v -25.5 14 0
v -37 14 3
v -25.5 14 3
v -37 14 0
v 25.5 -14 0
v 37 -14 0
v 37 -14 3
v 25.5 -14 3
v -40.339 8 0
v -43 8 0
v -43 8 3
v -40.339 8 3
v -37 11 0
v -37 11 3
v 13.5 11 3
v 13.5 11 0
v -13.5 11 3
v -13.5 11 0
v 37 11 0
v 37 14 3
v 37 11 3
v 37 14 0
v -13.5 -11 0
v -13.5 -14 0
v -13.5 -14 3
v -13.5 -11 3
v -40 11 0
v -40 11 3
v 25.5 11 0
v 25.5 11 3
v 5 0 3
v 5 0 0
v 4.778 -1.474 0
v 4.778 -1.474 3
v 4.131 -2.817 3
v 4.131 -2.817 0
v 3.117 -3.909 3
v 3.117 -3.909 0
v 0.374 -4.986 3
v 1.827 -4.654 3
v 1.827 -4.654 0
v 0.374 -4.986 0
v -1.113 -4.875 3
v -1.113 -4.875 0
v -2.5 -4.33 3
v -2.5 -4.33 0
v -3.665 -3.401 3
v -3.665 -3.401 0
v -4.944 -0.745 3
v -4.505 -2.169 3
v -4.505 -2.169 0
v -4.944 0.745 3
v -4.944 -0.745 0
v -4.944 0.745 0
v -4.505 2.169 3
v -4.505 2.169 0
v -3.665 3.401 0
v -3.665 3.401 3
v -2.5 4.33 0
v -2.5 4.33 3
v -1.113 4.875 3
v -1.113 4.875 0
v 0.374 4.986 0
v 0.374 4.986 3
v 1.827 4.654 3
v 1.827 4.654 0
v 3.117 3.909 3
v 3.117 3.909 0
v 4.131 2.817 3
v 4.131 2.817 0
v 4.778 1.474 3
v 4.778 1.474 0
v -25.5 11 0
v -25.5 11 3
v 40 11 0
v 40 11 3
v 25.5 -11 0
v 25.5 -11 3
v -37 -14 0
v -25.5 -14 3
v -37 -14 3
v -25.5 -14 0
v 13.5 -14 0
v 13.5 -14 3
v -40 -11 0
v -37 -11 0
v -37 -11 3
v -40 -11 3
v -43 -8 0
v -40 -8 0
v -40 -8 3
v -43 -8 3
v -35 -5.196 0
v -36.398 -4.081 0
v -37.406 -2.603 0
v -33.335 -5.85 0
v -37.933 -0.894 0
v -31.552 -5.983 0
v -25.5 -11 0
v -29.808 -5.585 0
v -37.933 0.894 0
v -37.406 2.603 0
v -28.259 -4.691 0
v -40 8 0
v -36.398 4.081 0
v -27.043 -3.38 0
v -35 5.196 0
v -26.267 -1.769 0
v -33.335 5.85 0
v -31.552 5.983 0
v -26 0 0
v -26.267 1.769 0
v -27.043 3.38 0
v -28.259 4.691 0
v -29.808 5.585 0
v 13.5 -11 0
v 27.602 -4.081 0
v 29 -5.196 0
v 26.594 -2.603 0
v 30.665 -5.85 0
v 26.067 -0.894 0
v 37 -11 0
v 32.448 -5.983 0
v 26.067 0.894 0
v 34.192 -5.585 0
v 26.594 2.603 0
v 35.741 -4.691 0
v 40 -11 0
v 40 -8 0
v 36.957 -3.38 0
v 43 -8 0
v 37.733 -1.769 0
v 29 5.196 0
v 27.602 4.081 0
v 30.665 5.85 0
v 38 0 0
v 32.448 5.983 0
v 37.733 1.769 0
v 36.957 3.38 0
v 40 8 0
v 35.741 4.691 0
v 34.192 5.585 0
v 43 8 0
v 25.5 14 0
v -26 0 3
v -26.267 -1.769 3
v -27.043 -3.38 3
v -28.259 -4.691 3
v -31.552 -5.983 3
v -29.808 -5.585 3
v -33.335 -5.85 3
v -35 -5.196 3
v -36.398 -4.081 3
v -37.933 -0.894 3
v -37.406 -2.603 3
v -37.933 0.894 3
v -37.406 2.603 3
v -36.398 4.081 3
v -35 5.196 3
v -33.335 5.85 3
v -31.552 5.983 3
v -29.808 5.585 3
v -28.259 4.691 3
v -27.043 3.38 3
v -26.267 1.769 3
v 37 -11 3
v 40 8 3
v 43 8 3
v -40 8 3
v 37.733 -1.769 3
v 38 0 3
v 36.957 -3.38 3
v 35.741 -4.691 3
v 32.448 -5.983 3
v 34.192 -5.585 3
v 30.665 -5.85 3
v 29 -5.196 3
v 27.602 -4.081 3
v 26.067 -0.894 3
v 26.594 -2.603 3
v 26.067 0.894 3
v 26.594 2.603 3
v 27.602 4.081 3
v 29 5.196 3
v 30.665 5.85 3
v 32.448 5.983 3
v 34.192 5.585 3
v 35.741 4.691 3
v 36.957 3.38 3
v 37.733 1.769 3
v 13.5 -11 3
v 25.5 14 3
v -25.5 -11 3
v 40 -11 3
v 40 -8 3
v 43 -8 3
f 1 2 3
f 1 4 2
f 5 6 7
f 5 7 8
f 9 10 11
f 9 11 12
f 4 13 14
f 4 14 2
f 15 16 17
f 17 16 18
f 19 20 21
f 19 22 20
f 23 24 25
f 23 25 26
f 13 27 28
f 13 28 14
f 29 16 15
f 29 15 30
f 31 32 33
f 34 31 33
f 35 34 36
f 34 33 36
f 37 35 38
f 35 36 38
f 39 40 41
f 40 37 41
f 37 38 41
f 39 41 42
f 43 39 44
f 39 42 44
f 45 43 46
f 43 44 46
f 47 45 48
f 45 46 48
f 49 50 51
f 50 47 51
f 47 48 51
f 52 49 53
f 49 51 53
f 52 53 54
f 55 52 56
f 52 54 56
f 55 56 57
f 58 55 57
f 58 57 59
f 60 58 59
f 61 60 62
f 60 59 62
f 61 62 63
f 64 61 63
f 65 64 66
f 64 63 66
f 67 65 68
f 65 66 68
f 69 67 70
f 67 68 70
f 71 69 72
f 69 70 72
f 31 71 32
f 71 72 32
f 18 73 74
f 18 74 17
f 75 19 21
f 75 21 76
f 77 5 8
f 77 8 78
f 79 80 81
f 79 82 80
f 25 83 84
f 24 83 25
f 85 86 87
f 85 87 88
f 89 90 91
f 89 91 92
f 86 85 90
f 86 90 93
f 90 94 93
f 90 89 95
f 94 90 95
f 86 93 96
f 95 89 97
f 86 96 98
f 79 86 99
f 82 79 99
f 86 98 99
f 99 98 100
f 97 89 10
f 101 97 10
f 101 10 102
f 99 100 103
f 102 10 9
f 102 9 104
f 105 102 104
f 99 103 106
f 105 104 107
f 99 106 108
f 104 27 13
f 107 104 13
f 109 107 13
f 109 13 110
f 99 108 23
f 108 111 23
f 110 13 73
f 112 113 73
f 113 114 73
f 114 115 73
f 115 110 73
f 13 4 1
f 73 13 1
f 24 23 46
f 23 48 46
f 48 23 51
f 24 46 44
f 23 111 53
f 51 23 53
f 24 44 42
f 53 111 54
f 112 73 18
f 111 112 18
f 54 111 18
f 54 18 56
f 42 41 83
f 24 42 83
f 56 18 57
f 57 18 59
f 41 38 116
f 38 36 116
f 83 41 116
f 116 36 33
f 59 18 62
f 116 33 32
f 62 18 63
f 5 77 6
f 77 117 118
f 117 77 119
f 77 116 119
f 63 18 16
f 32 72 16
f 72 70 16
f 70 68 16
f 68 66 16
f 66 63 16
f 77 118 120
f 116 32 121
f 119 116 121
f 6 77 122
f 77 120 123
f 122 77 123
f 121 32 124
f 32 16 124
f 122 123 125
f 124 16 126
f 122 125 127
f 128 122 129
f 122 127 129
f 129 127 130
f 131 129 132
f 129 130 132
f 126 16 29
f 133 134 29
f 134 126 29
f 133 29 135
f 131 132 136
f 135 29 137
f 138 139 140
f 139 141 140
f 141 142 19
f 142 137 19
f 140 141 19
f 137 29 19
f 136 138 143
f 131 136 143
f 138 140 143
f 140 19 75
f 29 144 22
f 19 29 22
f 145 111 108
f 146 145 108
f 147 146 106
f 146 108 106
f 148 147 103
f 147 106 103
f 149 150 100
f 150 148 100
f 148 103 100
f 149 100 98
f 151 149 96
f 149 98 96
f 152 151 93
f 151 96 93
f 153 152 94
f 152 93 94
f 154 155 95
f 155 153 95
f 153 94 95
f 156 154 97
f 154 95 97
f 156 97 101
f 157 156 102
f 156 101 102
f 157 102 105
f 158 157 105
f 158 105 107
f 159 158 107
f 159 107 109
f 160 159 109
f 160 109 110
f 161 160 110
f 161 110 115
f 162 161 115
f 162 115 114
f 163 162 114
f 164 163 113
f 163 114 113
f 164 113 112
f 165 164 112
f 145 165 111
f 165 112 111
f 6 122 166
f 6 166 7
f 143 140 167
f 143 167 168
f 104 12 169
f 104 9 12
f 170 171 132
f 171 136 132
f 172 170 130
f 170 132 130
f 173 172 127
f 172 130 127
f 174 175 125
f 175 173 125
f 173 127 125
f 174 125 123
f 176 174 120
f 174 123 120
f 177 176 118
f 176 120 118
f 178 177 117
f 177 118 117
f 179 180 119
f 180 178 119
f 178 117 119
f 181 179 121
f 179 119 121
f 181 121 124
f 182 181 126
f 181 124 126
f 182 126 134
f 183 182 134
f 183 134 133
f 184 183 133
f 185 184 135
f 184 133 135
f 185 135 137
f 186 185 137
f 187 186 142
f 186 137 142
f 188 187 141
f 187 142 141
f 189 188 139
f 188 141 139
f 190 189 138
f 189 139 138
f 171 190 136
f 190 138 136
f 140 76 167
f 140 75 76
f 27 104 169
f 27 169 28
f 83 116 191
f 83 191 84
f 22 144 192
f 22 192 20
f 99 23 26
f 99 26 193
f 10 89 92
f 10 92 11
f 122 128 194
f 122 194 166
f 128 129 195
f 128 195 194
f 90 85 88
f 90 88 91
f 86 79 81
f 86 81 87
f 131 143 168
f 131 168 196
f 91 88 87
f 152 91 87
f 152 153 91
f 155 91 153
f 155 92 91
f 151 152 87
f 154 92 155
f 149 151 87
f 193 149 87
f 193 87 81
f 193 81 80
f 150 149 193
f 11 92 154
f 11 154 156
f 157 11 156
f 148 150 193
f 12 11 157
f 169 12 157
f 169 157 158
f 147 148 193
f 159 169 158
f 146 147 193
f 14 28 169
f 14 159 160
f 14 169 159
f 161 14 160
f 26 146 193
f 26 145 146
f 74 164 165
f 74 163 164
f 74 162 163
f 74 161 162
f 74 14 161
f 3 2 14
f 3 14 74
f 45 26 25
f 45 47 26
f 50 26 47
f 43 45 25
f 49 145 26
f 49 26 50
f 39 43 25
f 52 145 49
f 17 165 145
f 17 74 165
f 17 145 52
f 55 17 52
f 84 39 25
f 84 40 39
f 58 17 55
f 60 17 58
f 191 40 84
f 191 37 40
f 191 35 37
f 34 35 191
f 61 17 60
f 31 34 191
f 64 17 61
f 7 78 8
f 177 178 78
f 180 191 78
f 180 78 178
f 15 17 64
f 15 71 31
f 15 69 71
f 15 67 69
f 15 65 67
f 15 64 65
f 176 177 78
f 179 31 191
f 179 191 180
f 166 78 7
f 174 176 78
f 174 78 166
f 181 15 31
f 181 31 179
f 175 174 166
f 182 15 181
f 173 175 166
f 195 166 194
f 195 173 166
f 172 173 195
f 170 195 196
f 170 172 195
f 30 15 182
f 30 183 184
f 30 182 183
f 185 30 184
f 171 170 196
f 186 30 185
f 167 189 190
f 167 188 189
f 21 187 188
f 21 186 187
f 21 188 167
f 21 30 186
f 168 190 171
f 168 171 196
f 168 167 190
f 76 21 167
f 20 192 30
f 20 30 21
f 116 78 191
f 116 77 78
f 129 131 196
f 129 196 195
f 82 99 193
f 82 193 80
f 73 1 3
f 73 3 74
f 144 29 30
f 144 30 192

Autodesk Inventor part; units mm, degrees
ref_plane "YZ Plane" through (0, 0, 0) normal (1, 0, 0) x (0, 1, 0)
ref_plane "XZ Plane" through (0, 0, 0) normal (0, 1, 0) x (-1, 0, 0)
ref_plane "XY Plane" through (0, 0, 0) normal (0, 0, 1) x (1, 0, 0)
sketch "Sketch2" plane through (0, 0, 0) normal (0, 0, 1) x (1, 0, 0)
  circle A0 centre (-32, 0) radius 7.5 construction
  circle A1 centre (32, 0) radius 7.5 construction
  circle A2 centre (0, 0) radius 5 projected
  line L0 (-13.5, 14) -> (13.5, 14) projected
  line L1 (13.5, 14) -> (13.5, 11) projected
  line L2 (13.5, 11) -> (25.5, 11) projected
  line L3 (25.5, 11) -> (25.5, 14) projected
  line L4 (25.5, 14) -> (37, 14) projected
  line L5 (37, 14) -> (37, 11) projected
  line L6 (37, 11) -> (40, 11) projected
  line L7 (40, 11) -> (40, 8) projected
  line L8 (40, 8) -> (43, 8) projected
  line L9 (43, 8) -> (43, -8) projected
  line L10 (43, -8) -> (40, -8) projected
  line L11 (40, -8) -> (40, -11) projected
  line L12 (40, -11) -> (37, -11) projected
  line L13 (37, -11) -> (37, -14) projected
  line L14 (37, -14) -> (25.5, -14) projected
  line L15 (25.5, -14) -> (25.5, -11) projected
  line L16 (25.5, -11) -> (13.5, -11) projected
  line L17 (13.5, -11) -> (13.5, -14) projected
  line L18 (13.5, -14) -> (-13.5, -14) projected
  line L19 (-13.5, -14) -> (-13.5, -11) projected
  line L20 (-13.5, -11) -> (-25.5, -11) projected
  line L21 (-25.5, -11) -> (-25.5, -14) projected
  line L22 (-25.5, -14) -> (-37, -14) projected
  line L23 (-37, -14) -> (-37, -11) projected
  line L24 (-37, -11) -> (-40, -11) projected
  line L25 (-40, -11) -> (-40, -8) projected
  line L26 (-40, -8) -> (-43, -8) projected
  line L27 (-43, -8) -> (-43, 8) projected
  line L28 (-43, 8) -> (-40, 8) projected
  line L29 (-40, 8) -> (-40, 11) projected
  line L30 (-40, 11) -> (-37, 11) projected
  line L31 (-37, 11) -> (-37, 14) projected
  line L32 (-37, 14) -> (-25.5, 14) projected
  line L33 (-25.5, 14) -> (-25.5, 11) projected
  line L34 (-25.5, 11) -> (-13.5, 11) projected
  line L35 (-13.5, 11) -> (-13.5, 14) projected
  circle A3 centre (-32, 0) radius 6
  circle A4 centre (32, 0) radius 6
  line L36 (25.5, 11) -> (-25.5, 11)
  line L37 (-25.5, 14) -> (-25.5, 11)
  line L38 (-25.5, 14) -> (-37, 14)
  line L39 (-37, 11) -> (-37, 14)
  line L40 (-37, 11) -> (-40, 11)
  line L41 (-40, 8) -> (-40, 11)
  line L42 (-40.3391, 8) -> (-43, 8)
  line L43 (-43, -8) -> (-43, 8)
  line L44 (-43, -8) -> (-40, -8)
  line L45 (-40, -11) -> (-40, -8)
  line L46 (-40, -11) -> (-37, -11)
  line L47 (-37, -11) -> (-37, -14)
  line L48 (-37, -14) -> (-25.5, -14)
  line L49 (-25.5, -11) -> (-25.5, -14)
  line L50 (-25.5, -11) -> (-13.5, -11)
  line L51 (-13.5, -11) -> (-13.5, -14)
  line L52 (13.5, -14) -> (-13.5, -14)
  line L53 (13.5, -11) -> (13.5, -14)
  line L54 (13.5, -11) -> (25.5, -11)
  line L55 (25.5, -11) -> (25.5, -14)
  line L56 (25.5, -14) -> (37, -14)
  line L57 (37, -11) -> (37, -14)
  line L58 (37, -11) -> (40, -11)
  line L59 (40, -11) -> (40, -8)
  line L60 (40, -8) -> (43, -8)
  line L61 (43, -8) -> (43, 8)
  line L62 (43, 8) -> (40, 8)
  line L63 (40, 8) -> (40, 11)
  line L64 (37, 11) -> (40, 11)
  line L65 (37, 11) -> (37, 14)
  line L66 (37, 14) -> (25.5, 14)
  line L67 (25.5, 14) -> (25.5, 11)
  dimension "d11" = 12
  dimension "d12" = 12
extrude "Extrusion1" add sketch "Sketch2" along normal blind 3 contours L36 L2 L3 L4 L5 L6 L7 L8 L9 L10 L11 L12 L13 L14 L15 L16 L17 L18 L19 L20 L21 L22 L23 L24 L25 L26 L27 L28 L29 L30 L31 L32 L33 L34
properties part number "Bearing-Outer"
